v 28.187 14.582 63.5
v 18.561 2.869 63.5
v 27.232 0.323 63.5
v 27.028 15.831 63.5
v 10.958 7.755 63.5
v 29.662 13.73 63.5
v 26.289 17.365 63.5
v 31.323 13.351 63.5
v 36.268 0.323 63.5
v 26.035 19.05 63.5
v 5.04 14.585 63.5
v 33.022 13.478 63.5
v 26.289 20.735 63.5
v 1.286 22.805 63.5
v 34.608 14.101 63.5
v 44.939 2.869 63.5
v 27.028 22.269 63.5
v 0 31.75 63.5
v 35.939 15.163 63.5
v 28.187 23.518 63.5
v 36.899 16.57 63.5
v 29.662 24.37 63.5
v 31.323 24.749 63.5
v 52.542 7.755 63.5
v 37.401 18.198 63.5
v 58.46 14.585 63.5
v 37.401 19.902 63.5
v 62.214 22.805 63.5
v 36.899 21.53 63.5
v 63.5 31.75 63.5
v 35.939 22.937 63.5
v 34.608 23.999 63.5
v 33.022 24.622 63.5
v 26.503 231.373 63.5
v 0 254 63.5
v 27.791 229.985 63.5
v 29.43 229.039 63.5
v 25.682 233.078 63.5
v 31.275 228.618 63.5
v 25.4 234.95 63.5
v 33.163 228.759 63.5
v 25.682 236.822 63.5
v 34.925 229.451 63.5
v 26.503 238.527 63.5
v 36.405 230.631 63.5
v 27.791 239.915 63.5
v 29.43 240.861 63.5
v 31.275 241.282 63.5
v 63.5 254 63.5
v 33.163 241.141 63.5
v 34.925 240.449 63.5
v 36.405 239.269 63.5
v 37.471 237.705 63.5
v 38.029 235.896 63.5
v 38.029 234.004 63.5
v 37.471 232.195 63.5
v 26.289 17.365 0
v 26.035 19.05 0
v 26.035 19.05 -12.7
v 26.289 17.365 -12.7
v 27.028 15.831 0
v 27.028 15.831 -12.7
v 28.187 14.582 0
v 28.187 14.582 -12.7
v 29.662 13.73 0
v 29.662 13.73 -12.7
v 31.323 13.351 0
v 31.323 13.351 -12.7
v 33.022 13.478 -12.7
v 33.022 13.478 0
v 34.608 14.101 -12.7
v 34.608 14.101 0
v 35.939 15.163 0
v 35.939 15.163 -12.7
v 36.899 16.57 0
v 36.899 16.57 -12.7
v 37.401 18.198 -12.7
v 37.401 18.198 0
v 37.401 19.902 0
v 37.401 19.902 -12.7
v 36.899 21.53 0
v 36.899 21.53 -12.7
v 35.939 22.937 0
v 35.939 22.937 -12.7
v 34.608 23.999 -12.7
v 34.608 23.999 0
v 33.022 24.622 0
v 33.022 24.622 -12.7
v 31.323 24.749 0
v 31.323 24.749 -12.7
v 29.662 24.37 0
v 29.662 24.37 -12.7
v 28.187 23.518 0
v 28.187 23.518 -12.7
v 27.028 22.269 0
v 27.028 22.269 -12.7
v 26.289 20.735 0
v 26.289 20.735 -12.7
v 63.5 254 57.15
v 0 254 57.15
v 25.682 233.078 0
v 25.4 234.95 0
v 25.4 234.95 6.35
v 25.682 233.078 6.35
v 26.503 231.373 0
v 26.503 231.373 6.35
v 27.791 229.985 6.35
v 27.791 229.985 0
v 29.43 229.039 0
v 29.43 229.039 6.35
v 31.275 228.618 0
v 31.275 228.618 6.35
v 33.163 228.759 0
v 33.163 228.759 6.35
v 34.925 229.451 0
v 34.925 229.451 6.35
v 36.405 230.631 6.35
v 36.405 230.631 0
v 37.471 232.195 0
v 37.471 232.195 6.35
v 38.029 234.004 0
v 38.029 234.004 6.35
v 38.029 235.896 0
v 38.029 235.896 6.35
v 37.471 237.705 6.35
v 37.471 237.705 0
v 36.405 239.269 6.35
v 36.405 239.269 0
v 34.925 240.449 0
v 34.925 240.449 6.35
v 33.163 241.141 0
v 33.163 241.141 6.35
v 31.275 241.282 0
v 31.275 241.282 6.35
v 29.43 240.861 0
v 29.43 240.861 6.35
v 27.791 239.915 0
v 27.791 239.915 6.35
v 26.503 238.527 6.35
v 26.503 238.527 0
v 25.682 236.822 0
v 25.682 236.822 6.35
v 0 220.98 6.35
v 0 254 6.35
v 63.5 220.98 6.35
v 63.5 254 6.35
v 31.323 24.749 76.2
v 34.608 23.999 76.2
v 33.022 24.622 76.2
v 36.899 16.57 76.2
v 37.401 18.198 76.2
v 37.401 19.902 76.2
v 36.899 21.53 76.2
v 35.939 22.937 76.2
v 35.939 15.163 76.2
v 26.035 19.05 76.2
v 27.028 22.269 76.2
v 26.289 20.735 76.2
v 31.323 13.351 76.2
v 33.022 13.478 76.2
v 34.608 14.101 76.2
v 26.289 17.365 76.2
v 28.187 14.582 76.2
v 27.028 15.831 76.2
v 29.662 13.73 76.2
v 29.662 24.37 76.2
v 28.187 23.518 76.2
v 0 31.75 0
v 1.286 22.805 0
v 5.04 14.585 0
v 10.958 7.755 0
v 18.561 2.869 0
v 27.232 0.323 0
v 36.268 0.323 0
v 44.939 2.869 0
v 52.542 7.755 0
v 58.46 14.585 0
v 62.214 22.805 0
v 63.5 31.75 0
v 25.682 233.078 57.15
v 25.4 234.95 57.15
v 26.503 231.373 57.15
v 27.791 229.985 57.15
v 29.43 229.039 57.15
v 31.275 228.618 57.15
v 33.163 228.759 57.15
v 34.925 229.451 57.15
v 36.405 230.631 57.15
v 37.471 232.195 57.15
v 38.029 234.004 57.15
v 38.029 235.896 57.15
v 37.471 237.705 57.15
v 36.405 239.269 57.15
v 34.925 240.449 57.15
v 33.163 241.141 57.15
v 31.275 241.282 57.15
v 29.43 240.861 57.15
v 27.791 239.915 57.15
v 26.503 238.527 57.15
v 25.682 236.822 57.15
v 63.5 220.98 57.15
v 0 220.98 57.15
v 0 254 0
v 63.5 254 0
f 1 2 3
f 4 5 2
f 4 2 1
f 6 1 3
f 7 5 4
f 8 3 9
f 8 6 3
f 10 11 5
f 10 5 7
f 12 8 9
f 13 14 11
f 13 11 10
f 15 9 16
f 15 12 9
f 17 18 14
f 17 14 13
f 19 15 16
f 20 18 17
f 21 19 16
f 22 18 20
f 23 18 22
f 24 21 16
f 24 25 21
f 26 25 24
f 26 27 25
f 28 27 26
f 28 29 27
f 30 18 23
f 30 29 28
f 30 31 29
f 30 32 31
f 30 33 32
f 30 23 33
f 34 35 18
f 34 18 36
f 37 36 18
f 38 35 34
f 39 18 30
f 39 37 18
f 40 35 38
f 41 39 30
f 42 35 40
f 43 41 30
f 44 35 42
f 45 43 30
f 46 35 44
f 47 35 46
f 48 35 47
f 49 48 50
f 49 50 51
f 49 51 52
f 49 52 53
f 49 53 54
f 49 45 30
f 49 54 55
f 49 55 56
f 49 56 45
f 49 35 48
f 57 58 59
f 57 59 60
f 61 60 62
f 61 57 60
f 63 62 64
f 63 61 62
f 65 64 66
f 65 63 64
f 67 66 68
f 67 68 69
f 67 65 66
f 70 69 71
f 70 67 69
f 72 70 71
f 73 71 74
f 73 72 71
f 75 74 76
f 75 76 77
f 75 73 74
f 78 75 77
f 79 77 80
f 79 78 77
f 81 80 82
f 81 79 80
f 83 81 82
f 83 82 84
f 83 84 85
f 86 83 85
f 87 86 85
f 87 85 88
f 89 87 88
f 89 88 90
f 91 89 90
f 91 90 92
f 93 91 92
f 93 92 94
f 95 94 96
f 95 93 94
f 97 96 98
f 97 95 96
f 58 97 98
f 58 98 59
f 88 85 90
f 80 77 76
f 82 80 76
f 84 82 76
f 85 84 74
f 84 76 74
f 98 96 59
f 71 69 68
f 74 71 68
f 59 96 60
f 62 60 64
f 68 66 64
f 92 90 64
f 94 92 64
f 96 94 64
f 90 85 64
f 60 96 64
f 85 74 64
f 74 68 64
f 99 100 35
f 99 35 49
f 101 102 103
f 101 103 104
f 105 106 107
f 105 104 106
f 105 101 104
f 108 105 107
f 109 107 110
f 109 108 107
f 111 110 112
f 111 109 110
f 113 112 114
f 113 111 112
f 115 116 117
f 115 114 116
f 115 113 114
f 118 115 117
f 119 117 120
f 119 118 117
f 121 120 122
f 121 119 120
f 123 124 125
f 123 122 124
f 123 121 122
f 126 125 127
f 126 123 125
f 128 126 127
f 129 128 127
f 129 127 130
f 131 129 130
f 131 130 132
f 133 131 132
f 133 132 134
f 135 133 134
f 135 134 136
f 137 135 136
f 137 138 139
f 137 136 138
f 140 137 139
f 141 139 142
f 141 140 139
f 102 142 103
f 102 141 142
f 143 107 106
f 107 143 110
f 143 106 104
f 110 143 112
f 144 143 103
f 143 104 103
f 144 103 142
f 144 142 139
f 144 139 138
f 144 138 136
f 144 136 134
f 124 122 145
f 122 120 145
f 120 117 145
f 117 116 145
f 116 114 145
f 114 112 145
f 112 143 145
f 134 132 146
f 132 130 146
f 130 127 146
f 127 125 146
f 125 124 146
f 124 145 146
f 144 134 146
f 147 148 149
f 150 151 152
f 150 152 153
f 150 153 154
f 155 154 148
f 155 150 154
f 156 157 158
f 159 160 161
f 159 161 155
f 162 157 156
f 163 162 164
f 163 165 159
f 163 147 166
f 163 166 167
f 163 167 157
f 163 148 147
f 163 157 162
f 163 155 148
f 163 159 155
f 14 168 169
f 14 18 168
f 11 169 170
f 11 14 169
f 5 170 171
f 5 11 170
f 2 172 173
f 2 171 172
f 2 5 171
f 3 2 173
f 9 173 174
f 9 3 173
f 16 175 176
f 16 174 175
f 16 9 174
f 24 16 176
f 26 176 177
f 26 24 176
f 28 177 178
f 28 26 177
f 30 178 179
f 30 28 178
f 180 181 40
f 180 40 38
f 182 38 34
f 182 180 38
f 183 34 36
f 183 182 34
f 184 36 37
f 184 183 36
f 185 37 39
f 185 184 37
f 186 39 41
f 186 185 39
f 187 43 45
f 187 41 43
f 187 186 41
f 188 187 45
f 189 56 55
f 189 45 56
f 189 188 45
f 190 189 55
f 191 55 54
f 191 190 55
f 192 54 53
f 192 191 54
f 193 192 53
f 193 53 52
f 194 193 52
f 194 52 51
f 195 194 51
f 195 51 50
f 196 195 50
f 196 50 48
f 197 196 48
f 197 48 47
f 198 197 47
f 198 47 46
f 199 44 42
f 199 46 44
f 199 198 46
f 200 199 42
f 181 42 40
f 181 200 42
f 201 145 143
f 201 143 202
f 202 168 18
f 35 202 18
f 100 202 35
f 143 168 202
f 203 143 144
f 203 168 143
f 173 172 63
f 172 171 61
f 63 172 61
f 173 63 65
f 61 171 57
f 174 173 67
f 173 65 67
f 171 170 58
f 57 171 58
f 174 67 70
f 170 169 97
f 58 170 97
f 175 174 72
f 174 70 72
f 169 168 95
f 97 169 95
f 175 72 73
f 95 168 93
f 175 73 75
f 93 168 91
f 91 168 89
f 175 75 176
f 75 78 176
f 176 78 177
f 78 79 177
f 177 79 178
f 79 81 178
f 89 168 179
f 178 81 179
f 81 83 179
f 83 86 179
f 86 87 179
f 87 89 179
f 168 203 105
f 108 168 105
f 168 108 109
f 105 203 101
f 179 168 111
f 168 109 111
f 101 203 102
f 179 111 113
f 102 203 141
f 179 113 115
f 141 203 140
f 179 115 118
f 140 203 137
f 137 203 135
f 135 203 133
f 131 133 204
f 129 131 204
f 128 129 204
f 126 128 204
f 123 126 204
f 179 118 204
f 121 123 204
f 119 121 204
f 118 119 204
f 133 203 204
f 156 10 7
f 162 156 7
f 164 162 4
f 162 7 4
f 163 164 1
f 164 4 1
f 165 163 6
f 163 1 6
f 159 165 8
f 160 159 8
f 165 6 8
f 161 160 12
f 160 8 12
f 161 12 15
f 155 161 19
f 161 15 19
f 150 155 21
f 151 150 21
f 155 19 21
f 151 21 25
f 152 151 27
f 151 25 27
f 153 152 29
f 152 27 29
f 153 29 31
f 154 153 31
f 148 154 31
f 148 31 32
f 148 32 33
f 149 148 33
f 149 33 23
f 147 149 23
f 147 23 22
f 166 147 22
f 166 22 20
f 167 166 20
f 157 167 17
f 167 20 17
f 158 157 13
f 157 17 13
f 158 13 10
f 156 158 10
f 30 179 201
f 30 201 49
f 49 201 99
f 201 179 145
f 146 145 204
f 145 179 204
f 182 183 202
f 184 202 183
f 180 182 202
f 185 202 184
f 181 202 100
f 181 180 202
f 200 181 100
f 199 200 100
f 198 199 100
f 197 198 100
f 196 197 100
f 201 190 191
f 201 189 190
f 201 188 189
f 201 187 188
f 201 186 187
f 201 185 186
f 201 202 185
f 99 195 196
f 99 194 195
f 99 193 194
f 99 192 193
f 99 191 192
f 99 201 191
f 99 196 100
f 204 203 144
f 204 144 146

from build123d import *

# Parameters (mm, degrees)
SKETCH1_W               = 63.5
SKETCH1_H               = 254
BOSS_EXTRUDE1_DEPTH     = 63.5
FILLET1_RADIUS          = 31.75
FILLET1_LENGTH          = 63.5
SKETCH2_R               = 5.715
BOSS_EXTRUDE2_DEPTH     = 12.7
CUT_EXTRUDE1_DEPTH      = 84.836
CUT_EXTRUDE1_DEPTH_BACK = 60.96
SKETCH3_R               = 6.35
CUT_EXTRUDE2_DEPTH      = 69.596
CUT_EXTRUDE2_DEPTH_BACK = 117.602
SKETCH4_W               = 50.8
SKETCH4_H               = 54.314943323


with BuildPart() as part:
    # Sketch1 → Boss-Extrude1 (new body)
    with BuildSketch(Plane.XY):
        with Locations((31.75, 127)):
            Rectangle(SKETCH1_W, SKETCH1_H)
    extrude(amount=BOSS_EXTRUDE1_DEPTH)

    # Fillet1: full round fillet: the end face becomes a half cylinder, R = half its width
    fillet1_face = Plane((31.75, 0, 31.75), x_dir=(0, 0, 1), z_dir=(0, -1, 0))  # on the end face: x along it, z out of the body
    fillet1_slab = fillet1_face.offset(-FILLET1_RADIUS / 2) * Box(FILLET1_LENGTH, 2 * FILLET1_RADIUS, FILLET1_RADIUS, mode=Mode.PRIVATE)  # the body's end, R deep
    fillet1_round = Plane((31.75, 31.75, 31.75), x_dir=(0, -1, 0), z_dir=(0, 0, 1)) * Cylinder(FILLET1_RADIUS, FILLET1_LENGTH, mode=Mode.PRIVATE)  # its axis R under the face
    add(fillet1_slab - fillet1_round, mode=Mode.SUBTRACT)

    # Sketch2 → Boss-Extrude2 (add)
    with BuildSketch(Plane.XY.offset(63.5)):
        with Locations(Location((31.75, 19.05, 0), (0, 0, 180))):
            Circle(SKETCH2_R)
    boss_extrude2 = extrude(amount=BOSS_EXTRUDE2_DEPTH)

    # Mirror1: Boss-Extrude2 across plane
    add(boss_extrude2.mirror(Plane.XY.offset(31.75)))

    # Sketch3 → Cut-Extrude1 (cut, two sides: drawn at the far end of the back side and taken through both)
    with BuildSketch(Plane.XY.offset(31.75).offset(-CUT_EXTRUDE1_DEPTH_BACK)):
        with Locations(Location((31.75, 234.95, 0), (0, 0, 180))):
            Circle(SKETCH3_R)
    extrude(amount=CUT_EXTRUDE1_DEPTH + CUT_EXTRUDE1_DEPTH_BACK, mode=Mode.SUBTRACT)

    # Sketch4 → Cut-Extrude2 (cut, two sides: drawn at the far end of the back side and taken through both)
    with BuildSketch(Plane.ZY.offset(-CUT_EXTRUDE2_DEPTH_BACK)):
        with Locations((31.75, 248.137471662)):
            Rectangle(SKETCH4_W, SKETCH4_H)
    extrude(amount=CUT_EXTRUDE2_DEPTH + CUT_EXTRUDE2_DEPTH_BACK, mode=Mode.SUBTRACT)


solid = part.part
